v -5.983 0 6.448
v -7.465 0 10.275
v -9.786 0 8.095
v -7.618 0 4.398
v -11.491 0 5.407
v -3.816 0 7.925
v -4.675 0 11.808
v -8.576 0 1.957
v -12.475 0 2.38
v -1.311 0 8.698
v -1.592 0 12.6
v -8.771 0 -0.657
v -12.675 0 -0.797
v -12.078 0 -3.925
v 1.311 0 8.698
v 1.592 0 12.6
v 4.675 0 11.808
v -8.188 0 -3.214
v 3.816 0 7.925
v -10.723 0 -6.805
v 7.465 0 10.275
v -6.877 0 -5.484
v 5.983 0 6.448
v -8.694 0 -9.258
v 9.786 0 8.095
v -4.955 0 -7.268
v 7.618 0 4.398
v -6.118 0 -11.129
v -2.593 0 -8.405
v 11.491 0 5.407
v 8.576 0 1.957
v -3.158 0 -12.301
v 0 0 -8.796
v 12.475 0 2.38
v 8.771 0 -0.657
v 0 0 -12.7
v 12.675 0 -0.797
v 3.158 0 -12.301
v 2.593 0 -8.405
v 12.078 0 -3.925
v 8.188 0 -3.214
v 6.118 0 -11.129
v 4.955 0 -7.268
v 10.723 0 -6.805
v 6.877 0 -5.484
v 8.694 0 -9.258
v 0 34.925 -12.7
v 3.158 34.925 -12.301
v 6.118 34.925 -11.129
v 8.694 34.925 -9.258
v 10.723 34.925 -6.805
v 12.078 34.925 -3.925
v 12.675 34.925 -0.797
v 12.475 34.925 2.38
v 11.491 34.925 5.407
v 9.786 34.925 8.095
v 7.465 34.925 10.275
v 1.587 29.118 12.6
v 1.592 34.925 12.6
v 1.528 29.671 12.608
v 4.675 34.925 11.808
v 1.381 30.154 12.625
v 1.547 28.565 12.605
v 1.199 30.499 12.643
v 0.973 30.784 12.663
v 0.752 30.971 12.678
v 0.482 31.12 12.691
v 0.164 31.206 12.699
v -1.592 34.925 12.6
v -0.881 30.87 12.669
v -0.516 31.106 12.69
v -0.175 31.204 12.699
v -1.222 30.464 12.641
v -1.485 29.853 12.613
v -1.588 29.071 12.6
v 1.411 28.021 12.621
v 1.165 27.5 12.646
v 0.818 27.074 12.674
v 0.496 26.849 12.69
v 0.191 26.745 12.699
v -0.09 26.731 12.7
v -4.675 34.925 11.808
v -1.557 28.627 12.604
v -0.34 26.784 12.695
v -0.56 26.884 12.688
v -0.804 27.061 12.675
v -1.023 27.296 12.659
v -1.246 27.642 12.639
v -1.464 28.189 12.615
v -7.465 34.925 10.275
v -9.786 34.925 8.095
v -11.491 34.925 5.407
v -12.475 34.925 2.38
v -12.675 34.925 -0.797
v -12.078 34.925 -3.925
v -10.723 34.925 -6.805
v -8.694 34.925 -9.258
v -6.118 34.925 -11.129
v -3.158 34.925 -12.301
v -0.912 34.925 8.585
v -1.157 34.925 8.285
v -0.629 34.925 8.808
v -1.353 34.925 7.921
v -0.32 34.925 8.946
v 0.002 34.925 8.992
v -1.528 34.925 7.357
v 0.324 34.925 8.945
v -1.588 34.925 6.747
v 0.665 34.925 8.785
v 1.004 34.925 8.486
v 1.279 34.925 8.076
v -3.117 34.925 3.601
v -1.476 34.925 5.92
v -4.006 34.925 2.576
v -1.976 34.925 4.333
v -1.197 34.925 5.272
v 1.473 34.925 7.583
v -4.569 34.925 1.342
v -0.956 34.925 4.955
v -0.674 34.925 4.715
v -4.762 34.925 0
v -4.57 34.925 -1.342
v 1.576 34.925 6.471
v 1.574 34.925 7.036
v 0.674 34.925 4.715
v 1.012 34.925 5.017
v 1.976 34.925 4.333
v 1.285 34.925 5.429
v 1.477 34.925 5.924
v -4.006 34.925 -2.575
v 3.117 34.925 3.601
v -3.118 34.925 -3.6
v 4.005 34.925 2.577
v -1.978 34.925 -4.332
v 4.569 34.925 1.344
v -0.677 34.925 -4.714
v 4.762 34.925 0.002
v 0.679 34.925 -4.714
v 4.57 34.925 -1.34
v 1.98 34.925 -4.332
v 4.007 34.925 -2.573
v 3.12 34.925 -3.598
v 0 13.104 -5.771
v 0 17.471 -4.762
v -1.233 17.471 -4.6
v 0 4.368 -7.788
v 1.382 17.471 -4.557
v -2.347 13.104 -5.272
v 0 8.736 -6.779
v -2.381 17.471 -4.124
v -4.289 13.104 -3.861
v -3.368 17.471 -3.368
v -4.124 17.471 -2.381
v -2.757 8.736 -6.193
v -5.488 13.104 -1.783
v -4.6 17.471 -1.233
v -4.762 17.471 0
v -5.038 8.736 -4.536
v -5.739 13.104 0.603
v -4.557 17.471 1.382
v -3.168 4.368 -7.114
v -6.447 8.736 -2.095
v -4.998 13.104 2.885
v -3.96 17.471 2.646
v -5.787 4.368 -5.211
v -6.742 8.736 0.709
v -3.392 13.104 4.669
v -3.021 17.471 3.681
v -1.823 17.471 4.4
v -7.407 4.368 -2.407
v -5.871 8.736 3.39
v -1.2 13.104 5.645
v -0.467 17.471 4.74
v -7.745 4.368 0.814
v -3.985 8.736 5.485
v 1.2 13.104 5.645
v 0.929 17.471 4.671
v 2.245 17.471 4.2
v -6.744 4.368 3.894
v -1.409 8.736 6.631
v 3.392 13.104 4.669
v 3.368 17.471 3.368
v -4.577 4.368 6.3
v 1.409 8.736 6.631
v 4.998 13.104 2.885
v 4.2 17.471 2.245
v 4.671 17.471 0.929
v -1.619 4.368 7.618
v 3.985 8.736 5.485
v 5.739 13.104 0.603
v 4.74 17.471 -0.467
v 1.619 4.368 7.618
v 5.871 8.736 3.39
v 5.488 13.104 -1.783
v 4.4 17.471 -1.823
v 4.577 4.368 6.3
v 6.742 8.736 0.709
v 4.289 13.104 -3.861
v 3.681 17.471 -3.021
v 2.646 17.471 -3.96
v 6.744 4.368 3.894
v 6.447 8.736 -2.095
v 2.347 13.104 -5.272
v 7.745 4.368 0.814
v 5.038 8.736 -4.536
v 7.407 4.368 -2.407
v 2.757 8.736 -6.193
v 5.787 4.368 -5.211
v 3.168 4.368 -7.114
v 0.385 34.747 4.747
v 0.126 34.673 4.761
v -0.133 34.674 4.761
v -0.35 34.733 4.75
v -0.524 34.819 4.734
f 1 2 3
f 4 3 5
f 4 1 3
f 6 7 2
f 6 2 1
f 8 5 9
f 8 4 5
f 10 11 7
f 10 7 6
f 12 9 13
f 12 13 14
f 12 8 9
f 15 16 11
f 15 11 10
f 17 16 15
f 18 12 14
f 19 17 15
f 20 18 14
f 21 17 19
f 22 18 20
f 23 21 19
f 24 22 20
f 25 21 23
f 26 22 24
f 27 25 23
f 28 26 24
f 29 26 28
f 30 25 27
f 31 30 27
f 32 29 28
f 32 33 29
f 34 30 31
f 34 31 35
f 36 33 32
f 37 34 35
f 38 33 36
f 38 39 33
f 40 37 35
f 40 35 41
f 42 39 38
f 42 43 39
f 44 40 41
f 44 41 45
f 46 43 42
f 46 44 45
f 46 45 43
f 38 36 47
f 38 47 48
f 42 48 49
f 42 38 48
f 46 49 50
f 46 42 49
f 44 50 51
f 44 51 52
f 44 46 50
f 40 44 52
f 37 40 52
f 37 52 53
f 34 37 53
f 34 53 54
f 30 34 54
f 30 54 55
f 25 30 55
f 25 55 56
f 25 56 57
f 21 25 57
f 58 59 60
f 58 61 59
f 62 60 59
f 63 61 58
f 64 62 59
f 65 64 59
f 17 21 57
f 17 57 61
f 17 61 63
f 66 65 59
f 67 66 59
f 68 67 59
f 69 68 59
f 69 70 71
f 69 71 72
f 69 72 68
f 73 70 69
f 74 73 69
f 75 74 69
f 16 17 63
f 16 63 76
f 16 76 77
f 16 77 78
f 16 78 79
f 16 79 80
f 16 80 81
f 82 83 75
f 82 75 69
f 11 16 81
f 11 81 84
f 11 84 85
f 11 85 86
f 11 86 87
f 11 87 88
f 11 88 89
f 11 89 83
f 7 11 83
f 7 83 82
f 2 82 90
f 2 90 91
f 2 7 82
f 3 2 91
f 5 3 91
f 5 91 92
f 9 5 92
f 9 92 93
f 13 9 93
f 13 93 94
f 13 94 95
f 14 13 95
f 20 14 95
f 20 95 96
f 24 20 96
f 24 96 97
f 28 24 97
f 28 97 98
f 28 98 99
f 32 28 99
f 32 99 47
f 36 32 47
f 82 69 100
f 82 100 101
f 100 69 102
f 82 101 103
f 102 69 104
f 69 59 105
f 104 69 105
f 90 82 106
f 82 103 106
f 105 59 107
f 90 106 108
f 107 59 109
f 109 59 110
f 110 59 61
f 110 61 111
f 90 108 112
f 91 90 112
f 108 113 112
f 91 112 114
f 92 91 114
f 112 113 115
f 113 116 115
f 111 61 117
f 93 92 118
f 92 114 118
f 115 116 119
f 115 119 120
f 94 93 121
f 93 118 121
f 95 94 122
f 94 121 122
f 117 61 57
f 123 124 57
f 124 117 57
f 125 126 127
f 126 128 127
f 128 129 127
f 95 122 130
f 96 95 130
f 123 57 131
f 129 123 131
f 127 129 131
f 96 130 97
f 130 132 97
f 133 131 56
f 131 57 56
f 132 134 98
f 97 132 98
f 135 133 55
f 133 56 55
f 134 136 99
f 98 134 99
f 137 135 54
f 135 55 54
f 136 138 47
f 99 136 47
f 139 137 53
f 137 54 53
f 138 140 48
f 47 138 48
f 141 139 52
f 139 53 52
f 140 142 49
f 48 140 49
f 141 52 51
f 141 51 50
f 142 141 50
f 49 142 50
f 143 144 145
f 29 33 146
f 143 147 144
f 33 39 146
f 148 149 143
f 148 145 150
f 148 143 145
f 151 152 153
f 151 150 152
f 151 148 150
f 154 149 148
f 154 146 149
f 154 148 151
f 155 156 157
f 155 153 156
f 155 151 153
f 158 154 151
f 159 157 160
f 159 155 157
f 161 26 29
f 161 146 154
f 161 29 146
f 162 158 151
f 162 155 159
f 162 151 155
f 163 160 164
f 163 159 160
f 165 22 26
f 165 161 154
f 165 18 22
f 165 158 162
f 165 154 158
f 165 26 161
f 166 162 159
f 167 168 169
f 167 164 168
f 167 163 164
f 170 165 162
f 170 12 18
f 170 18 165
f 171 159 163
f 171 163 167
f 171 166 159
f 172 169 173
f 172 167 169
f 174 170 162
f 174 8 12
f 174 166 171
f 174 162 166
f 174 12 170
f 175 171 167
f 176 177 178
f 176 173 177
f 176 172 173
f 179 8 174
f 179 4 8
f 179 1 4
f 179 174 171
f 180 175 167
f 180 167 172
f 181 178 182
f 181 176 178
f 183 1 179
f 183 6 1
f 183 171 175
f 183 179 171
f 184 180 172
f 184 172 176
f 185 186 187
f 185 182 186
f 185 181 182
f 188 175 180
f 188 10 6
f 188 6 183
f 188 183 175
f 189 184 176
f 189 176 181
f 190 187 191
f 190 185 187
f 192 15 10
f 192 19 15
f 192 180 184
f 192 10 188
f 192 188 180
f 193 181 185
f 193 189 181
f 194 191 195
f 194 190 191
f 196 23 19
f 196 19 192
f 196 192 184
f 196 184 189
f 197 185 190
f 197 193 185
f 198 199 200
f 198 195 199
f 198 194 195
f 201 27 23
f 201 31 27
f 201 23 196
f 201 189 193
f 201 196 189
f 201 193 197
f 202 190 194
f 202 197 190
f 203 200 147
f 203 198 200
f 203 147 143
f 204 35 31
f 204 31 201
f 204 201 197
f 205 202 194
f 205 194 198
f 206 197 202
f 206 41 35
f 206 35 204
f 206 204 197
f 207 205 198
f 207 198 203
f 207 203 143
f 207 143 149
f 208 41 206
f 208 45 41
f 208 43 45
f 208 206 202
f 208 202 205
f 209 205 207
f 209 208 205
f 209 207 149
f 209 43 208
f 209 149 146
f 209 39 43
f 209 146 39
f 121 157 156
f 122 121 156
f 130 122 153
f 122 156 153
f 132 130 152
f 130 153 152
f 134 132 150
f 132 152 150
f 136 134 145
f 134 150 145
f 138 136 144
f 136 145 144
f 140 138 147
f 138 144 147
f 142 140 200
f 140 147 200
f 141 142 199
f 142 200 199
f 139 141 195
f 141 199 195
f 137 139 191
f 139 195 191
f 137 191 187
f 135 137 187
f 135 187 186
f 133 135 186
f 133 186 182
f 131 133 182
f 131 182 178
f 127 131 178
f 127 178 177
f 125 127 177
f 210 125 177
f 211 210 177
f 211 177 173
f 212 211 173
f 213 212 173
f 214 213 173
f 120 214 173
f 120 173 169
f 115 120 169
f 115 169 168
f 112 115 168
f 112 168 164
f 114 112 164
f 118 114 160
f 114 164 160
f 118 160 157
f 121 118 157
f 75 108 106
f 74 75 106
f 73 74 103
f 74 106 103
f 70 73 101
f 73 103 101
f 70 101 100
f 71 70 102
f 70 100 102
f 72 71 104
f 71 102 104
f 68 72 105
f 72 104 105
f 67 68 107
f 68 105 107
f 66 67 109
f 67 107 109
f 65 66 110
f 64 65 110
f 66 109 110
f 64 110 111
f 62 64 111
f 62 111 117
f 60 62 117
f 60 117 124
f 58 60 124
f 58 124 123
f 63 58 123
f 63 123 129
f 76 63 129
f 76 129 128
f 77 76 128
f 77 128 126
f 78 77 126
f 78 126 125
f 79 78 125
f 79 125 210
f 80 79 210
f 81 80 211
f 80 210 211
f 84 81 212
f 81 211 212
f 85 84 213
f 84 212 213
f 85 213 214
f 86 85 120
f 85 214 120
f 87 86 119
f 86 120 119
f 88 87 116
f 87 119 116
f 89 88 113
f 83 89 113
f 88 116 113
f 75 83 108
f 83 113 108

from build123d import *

# Parameters (mm, degrees)
SKETCH2_R                    = 12.7
BOSS_EXTRUDE1_DEPTH          = 34.925
F_3_8_0_375_DIAMETER_HOLE1_D = 9.525
F_1_8_0_125_DIAMETER_HOLE1_D = 3.175


with BuildPart() as part:
    # Sketch1 → Revolve1 (revolve)
    with BuildSketch(Plane.XY, mode=Mode.PRIVATE) as revolve1_sk:
        Polygon((0, 0), (0, 38.1), (-8.796078082, 0), align=None)
    revolve(revolve1_sk.sketch.rotate(Axis((0, 0, 0), (0, 1, 0)), 270), axis=Axis((0, 0, 0), (0, 1, 0)))


with BuildPart() as body_2:
    # Sketch2 → Boss-Extrude1 (new body)
    with BuildSketch(Plane.XZ):
        with Locations(Location((0, 0, 0), (0, 0, 270))):
            Circle(SKETCH2_R)
    extrude(amount=-BOSS_EXTRUDE1_DEPTH)

    # Combine1: cut part
    add(part.part, mode=Mode.SUBTRACT)

    # 3/8 (0.375) Diameter Hole1 (through all)
    with Locations(Plane(origin=(0, 34.925, 0), x_dir=(1, 0, 0), z_dir=(0, 1, 0))):
        with Locations((0, 0)):
            Hole(F_3_8_0_375_DIAMETER_HOLE1_D / 2)

    # 1/8 (0.125) Diameter Hole1 (through all)
    with Locations(Plane(origin=(0, 0, 0), x_dir=(1, 0, 0), z_dir=(0, -0.7071067811865475, 0.7071067811865477))):
        with Locations((0, 29.466465397)):
            Hole(F_1_8_0_125_DIAMETER_HOLE1_D / 2)


solid = body_2.part
